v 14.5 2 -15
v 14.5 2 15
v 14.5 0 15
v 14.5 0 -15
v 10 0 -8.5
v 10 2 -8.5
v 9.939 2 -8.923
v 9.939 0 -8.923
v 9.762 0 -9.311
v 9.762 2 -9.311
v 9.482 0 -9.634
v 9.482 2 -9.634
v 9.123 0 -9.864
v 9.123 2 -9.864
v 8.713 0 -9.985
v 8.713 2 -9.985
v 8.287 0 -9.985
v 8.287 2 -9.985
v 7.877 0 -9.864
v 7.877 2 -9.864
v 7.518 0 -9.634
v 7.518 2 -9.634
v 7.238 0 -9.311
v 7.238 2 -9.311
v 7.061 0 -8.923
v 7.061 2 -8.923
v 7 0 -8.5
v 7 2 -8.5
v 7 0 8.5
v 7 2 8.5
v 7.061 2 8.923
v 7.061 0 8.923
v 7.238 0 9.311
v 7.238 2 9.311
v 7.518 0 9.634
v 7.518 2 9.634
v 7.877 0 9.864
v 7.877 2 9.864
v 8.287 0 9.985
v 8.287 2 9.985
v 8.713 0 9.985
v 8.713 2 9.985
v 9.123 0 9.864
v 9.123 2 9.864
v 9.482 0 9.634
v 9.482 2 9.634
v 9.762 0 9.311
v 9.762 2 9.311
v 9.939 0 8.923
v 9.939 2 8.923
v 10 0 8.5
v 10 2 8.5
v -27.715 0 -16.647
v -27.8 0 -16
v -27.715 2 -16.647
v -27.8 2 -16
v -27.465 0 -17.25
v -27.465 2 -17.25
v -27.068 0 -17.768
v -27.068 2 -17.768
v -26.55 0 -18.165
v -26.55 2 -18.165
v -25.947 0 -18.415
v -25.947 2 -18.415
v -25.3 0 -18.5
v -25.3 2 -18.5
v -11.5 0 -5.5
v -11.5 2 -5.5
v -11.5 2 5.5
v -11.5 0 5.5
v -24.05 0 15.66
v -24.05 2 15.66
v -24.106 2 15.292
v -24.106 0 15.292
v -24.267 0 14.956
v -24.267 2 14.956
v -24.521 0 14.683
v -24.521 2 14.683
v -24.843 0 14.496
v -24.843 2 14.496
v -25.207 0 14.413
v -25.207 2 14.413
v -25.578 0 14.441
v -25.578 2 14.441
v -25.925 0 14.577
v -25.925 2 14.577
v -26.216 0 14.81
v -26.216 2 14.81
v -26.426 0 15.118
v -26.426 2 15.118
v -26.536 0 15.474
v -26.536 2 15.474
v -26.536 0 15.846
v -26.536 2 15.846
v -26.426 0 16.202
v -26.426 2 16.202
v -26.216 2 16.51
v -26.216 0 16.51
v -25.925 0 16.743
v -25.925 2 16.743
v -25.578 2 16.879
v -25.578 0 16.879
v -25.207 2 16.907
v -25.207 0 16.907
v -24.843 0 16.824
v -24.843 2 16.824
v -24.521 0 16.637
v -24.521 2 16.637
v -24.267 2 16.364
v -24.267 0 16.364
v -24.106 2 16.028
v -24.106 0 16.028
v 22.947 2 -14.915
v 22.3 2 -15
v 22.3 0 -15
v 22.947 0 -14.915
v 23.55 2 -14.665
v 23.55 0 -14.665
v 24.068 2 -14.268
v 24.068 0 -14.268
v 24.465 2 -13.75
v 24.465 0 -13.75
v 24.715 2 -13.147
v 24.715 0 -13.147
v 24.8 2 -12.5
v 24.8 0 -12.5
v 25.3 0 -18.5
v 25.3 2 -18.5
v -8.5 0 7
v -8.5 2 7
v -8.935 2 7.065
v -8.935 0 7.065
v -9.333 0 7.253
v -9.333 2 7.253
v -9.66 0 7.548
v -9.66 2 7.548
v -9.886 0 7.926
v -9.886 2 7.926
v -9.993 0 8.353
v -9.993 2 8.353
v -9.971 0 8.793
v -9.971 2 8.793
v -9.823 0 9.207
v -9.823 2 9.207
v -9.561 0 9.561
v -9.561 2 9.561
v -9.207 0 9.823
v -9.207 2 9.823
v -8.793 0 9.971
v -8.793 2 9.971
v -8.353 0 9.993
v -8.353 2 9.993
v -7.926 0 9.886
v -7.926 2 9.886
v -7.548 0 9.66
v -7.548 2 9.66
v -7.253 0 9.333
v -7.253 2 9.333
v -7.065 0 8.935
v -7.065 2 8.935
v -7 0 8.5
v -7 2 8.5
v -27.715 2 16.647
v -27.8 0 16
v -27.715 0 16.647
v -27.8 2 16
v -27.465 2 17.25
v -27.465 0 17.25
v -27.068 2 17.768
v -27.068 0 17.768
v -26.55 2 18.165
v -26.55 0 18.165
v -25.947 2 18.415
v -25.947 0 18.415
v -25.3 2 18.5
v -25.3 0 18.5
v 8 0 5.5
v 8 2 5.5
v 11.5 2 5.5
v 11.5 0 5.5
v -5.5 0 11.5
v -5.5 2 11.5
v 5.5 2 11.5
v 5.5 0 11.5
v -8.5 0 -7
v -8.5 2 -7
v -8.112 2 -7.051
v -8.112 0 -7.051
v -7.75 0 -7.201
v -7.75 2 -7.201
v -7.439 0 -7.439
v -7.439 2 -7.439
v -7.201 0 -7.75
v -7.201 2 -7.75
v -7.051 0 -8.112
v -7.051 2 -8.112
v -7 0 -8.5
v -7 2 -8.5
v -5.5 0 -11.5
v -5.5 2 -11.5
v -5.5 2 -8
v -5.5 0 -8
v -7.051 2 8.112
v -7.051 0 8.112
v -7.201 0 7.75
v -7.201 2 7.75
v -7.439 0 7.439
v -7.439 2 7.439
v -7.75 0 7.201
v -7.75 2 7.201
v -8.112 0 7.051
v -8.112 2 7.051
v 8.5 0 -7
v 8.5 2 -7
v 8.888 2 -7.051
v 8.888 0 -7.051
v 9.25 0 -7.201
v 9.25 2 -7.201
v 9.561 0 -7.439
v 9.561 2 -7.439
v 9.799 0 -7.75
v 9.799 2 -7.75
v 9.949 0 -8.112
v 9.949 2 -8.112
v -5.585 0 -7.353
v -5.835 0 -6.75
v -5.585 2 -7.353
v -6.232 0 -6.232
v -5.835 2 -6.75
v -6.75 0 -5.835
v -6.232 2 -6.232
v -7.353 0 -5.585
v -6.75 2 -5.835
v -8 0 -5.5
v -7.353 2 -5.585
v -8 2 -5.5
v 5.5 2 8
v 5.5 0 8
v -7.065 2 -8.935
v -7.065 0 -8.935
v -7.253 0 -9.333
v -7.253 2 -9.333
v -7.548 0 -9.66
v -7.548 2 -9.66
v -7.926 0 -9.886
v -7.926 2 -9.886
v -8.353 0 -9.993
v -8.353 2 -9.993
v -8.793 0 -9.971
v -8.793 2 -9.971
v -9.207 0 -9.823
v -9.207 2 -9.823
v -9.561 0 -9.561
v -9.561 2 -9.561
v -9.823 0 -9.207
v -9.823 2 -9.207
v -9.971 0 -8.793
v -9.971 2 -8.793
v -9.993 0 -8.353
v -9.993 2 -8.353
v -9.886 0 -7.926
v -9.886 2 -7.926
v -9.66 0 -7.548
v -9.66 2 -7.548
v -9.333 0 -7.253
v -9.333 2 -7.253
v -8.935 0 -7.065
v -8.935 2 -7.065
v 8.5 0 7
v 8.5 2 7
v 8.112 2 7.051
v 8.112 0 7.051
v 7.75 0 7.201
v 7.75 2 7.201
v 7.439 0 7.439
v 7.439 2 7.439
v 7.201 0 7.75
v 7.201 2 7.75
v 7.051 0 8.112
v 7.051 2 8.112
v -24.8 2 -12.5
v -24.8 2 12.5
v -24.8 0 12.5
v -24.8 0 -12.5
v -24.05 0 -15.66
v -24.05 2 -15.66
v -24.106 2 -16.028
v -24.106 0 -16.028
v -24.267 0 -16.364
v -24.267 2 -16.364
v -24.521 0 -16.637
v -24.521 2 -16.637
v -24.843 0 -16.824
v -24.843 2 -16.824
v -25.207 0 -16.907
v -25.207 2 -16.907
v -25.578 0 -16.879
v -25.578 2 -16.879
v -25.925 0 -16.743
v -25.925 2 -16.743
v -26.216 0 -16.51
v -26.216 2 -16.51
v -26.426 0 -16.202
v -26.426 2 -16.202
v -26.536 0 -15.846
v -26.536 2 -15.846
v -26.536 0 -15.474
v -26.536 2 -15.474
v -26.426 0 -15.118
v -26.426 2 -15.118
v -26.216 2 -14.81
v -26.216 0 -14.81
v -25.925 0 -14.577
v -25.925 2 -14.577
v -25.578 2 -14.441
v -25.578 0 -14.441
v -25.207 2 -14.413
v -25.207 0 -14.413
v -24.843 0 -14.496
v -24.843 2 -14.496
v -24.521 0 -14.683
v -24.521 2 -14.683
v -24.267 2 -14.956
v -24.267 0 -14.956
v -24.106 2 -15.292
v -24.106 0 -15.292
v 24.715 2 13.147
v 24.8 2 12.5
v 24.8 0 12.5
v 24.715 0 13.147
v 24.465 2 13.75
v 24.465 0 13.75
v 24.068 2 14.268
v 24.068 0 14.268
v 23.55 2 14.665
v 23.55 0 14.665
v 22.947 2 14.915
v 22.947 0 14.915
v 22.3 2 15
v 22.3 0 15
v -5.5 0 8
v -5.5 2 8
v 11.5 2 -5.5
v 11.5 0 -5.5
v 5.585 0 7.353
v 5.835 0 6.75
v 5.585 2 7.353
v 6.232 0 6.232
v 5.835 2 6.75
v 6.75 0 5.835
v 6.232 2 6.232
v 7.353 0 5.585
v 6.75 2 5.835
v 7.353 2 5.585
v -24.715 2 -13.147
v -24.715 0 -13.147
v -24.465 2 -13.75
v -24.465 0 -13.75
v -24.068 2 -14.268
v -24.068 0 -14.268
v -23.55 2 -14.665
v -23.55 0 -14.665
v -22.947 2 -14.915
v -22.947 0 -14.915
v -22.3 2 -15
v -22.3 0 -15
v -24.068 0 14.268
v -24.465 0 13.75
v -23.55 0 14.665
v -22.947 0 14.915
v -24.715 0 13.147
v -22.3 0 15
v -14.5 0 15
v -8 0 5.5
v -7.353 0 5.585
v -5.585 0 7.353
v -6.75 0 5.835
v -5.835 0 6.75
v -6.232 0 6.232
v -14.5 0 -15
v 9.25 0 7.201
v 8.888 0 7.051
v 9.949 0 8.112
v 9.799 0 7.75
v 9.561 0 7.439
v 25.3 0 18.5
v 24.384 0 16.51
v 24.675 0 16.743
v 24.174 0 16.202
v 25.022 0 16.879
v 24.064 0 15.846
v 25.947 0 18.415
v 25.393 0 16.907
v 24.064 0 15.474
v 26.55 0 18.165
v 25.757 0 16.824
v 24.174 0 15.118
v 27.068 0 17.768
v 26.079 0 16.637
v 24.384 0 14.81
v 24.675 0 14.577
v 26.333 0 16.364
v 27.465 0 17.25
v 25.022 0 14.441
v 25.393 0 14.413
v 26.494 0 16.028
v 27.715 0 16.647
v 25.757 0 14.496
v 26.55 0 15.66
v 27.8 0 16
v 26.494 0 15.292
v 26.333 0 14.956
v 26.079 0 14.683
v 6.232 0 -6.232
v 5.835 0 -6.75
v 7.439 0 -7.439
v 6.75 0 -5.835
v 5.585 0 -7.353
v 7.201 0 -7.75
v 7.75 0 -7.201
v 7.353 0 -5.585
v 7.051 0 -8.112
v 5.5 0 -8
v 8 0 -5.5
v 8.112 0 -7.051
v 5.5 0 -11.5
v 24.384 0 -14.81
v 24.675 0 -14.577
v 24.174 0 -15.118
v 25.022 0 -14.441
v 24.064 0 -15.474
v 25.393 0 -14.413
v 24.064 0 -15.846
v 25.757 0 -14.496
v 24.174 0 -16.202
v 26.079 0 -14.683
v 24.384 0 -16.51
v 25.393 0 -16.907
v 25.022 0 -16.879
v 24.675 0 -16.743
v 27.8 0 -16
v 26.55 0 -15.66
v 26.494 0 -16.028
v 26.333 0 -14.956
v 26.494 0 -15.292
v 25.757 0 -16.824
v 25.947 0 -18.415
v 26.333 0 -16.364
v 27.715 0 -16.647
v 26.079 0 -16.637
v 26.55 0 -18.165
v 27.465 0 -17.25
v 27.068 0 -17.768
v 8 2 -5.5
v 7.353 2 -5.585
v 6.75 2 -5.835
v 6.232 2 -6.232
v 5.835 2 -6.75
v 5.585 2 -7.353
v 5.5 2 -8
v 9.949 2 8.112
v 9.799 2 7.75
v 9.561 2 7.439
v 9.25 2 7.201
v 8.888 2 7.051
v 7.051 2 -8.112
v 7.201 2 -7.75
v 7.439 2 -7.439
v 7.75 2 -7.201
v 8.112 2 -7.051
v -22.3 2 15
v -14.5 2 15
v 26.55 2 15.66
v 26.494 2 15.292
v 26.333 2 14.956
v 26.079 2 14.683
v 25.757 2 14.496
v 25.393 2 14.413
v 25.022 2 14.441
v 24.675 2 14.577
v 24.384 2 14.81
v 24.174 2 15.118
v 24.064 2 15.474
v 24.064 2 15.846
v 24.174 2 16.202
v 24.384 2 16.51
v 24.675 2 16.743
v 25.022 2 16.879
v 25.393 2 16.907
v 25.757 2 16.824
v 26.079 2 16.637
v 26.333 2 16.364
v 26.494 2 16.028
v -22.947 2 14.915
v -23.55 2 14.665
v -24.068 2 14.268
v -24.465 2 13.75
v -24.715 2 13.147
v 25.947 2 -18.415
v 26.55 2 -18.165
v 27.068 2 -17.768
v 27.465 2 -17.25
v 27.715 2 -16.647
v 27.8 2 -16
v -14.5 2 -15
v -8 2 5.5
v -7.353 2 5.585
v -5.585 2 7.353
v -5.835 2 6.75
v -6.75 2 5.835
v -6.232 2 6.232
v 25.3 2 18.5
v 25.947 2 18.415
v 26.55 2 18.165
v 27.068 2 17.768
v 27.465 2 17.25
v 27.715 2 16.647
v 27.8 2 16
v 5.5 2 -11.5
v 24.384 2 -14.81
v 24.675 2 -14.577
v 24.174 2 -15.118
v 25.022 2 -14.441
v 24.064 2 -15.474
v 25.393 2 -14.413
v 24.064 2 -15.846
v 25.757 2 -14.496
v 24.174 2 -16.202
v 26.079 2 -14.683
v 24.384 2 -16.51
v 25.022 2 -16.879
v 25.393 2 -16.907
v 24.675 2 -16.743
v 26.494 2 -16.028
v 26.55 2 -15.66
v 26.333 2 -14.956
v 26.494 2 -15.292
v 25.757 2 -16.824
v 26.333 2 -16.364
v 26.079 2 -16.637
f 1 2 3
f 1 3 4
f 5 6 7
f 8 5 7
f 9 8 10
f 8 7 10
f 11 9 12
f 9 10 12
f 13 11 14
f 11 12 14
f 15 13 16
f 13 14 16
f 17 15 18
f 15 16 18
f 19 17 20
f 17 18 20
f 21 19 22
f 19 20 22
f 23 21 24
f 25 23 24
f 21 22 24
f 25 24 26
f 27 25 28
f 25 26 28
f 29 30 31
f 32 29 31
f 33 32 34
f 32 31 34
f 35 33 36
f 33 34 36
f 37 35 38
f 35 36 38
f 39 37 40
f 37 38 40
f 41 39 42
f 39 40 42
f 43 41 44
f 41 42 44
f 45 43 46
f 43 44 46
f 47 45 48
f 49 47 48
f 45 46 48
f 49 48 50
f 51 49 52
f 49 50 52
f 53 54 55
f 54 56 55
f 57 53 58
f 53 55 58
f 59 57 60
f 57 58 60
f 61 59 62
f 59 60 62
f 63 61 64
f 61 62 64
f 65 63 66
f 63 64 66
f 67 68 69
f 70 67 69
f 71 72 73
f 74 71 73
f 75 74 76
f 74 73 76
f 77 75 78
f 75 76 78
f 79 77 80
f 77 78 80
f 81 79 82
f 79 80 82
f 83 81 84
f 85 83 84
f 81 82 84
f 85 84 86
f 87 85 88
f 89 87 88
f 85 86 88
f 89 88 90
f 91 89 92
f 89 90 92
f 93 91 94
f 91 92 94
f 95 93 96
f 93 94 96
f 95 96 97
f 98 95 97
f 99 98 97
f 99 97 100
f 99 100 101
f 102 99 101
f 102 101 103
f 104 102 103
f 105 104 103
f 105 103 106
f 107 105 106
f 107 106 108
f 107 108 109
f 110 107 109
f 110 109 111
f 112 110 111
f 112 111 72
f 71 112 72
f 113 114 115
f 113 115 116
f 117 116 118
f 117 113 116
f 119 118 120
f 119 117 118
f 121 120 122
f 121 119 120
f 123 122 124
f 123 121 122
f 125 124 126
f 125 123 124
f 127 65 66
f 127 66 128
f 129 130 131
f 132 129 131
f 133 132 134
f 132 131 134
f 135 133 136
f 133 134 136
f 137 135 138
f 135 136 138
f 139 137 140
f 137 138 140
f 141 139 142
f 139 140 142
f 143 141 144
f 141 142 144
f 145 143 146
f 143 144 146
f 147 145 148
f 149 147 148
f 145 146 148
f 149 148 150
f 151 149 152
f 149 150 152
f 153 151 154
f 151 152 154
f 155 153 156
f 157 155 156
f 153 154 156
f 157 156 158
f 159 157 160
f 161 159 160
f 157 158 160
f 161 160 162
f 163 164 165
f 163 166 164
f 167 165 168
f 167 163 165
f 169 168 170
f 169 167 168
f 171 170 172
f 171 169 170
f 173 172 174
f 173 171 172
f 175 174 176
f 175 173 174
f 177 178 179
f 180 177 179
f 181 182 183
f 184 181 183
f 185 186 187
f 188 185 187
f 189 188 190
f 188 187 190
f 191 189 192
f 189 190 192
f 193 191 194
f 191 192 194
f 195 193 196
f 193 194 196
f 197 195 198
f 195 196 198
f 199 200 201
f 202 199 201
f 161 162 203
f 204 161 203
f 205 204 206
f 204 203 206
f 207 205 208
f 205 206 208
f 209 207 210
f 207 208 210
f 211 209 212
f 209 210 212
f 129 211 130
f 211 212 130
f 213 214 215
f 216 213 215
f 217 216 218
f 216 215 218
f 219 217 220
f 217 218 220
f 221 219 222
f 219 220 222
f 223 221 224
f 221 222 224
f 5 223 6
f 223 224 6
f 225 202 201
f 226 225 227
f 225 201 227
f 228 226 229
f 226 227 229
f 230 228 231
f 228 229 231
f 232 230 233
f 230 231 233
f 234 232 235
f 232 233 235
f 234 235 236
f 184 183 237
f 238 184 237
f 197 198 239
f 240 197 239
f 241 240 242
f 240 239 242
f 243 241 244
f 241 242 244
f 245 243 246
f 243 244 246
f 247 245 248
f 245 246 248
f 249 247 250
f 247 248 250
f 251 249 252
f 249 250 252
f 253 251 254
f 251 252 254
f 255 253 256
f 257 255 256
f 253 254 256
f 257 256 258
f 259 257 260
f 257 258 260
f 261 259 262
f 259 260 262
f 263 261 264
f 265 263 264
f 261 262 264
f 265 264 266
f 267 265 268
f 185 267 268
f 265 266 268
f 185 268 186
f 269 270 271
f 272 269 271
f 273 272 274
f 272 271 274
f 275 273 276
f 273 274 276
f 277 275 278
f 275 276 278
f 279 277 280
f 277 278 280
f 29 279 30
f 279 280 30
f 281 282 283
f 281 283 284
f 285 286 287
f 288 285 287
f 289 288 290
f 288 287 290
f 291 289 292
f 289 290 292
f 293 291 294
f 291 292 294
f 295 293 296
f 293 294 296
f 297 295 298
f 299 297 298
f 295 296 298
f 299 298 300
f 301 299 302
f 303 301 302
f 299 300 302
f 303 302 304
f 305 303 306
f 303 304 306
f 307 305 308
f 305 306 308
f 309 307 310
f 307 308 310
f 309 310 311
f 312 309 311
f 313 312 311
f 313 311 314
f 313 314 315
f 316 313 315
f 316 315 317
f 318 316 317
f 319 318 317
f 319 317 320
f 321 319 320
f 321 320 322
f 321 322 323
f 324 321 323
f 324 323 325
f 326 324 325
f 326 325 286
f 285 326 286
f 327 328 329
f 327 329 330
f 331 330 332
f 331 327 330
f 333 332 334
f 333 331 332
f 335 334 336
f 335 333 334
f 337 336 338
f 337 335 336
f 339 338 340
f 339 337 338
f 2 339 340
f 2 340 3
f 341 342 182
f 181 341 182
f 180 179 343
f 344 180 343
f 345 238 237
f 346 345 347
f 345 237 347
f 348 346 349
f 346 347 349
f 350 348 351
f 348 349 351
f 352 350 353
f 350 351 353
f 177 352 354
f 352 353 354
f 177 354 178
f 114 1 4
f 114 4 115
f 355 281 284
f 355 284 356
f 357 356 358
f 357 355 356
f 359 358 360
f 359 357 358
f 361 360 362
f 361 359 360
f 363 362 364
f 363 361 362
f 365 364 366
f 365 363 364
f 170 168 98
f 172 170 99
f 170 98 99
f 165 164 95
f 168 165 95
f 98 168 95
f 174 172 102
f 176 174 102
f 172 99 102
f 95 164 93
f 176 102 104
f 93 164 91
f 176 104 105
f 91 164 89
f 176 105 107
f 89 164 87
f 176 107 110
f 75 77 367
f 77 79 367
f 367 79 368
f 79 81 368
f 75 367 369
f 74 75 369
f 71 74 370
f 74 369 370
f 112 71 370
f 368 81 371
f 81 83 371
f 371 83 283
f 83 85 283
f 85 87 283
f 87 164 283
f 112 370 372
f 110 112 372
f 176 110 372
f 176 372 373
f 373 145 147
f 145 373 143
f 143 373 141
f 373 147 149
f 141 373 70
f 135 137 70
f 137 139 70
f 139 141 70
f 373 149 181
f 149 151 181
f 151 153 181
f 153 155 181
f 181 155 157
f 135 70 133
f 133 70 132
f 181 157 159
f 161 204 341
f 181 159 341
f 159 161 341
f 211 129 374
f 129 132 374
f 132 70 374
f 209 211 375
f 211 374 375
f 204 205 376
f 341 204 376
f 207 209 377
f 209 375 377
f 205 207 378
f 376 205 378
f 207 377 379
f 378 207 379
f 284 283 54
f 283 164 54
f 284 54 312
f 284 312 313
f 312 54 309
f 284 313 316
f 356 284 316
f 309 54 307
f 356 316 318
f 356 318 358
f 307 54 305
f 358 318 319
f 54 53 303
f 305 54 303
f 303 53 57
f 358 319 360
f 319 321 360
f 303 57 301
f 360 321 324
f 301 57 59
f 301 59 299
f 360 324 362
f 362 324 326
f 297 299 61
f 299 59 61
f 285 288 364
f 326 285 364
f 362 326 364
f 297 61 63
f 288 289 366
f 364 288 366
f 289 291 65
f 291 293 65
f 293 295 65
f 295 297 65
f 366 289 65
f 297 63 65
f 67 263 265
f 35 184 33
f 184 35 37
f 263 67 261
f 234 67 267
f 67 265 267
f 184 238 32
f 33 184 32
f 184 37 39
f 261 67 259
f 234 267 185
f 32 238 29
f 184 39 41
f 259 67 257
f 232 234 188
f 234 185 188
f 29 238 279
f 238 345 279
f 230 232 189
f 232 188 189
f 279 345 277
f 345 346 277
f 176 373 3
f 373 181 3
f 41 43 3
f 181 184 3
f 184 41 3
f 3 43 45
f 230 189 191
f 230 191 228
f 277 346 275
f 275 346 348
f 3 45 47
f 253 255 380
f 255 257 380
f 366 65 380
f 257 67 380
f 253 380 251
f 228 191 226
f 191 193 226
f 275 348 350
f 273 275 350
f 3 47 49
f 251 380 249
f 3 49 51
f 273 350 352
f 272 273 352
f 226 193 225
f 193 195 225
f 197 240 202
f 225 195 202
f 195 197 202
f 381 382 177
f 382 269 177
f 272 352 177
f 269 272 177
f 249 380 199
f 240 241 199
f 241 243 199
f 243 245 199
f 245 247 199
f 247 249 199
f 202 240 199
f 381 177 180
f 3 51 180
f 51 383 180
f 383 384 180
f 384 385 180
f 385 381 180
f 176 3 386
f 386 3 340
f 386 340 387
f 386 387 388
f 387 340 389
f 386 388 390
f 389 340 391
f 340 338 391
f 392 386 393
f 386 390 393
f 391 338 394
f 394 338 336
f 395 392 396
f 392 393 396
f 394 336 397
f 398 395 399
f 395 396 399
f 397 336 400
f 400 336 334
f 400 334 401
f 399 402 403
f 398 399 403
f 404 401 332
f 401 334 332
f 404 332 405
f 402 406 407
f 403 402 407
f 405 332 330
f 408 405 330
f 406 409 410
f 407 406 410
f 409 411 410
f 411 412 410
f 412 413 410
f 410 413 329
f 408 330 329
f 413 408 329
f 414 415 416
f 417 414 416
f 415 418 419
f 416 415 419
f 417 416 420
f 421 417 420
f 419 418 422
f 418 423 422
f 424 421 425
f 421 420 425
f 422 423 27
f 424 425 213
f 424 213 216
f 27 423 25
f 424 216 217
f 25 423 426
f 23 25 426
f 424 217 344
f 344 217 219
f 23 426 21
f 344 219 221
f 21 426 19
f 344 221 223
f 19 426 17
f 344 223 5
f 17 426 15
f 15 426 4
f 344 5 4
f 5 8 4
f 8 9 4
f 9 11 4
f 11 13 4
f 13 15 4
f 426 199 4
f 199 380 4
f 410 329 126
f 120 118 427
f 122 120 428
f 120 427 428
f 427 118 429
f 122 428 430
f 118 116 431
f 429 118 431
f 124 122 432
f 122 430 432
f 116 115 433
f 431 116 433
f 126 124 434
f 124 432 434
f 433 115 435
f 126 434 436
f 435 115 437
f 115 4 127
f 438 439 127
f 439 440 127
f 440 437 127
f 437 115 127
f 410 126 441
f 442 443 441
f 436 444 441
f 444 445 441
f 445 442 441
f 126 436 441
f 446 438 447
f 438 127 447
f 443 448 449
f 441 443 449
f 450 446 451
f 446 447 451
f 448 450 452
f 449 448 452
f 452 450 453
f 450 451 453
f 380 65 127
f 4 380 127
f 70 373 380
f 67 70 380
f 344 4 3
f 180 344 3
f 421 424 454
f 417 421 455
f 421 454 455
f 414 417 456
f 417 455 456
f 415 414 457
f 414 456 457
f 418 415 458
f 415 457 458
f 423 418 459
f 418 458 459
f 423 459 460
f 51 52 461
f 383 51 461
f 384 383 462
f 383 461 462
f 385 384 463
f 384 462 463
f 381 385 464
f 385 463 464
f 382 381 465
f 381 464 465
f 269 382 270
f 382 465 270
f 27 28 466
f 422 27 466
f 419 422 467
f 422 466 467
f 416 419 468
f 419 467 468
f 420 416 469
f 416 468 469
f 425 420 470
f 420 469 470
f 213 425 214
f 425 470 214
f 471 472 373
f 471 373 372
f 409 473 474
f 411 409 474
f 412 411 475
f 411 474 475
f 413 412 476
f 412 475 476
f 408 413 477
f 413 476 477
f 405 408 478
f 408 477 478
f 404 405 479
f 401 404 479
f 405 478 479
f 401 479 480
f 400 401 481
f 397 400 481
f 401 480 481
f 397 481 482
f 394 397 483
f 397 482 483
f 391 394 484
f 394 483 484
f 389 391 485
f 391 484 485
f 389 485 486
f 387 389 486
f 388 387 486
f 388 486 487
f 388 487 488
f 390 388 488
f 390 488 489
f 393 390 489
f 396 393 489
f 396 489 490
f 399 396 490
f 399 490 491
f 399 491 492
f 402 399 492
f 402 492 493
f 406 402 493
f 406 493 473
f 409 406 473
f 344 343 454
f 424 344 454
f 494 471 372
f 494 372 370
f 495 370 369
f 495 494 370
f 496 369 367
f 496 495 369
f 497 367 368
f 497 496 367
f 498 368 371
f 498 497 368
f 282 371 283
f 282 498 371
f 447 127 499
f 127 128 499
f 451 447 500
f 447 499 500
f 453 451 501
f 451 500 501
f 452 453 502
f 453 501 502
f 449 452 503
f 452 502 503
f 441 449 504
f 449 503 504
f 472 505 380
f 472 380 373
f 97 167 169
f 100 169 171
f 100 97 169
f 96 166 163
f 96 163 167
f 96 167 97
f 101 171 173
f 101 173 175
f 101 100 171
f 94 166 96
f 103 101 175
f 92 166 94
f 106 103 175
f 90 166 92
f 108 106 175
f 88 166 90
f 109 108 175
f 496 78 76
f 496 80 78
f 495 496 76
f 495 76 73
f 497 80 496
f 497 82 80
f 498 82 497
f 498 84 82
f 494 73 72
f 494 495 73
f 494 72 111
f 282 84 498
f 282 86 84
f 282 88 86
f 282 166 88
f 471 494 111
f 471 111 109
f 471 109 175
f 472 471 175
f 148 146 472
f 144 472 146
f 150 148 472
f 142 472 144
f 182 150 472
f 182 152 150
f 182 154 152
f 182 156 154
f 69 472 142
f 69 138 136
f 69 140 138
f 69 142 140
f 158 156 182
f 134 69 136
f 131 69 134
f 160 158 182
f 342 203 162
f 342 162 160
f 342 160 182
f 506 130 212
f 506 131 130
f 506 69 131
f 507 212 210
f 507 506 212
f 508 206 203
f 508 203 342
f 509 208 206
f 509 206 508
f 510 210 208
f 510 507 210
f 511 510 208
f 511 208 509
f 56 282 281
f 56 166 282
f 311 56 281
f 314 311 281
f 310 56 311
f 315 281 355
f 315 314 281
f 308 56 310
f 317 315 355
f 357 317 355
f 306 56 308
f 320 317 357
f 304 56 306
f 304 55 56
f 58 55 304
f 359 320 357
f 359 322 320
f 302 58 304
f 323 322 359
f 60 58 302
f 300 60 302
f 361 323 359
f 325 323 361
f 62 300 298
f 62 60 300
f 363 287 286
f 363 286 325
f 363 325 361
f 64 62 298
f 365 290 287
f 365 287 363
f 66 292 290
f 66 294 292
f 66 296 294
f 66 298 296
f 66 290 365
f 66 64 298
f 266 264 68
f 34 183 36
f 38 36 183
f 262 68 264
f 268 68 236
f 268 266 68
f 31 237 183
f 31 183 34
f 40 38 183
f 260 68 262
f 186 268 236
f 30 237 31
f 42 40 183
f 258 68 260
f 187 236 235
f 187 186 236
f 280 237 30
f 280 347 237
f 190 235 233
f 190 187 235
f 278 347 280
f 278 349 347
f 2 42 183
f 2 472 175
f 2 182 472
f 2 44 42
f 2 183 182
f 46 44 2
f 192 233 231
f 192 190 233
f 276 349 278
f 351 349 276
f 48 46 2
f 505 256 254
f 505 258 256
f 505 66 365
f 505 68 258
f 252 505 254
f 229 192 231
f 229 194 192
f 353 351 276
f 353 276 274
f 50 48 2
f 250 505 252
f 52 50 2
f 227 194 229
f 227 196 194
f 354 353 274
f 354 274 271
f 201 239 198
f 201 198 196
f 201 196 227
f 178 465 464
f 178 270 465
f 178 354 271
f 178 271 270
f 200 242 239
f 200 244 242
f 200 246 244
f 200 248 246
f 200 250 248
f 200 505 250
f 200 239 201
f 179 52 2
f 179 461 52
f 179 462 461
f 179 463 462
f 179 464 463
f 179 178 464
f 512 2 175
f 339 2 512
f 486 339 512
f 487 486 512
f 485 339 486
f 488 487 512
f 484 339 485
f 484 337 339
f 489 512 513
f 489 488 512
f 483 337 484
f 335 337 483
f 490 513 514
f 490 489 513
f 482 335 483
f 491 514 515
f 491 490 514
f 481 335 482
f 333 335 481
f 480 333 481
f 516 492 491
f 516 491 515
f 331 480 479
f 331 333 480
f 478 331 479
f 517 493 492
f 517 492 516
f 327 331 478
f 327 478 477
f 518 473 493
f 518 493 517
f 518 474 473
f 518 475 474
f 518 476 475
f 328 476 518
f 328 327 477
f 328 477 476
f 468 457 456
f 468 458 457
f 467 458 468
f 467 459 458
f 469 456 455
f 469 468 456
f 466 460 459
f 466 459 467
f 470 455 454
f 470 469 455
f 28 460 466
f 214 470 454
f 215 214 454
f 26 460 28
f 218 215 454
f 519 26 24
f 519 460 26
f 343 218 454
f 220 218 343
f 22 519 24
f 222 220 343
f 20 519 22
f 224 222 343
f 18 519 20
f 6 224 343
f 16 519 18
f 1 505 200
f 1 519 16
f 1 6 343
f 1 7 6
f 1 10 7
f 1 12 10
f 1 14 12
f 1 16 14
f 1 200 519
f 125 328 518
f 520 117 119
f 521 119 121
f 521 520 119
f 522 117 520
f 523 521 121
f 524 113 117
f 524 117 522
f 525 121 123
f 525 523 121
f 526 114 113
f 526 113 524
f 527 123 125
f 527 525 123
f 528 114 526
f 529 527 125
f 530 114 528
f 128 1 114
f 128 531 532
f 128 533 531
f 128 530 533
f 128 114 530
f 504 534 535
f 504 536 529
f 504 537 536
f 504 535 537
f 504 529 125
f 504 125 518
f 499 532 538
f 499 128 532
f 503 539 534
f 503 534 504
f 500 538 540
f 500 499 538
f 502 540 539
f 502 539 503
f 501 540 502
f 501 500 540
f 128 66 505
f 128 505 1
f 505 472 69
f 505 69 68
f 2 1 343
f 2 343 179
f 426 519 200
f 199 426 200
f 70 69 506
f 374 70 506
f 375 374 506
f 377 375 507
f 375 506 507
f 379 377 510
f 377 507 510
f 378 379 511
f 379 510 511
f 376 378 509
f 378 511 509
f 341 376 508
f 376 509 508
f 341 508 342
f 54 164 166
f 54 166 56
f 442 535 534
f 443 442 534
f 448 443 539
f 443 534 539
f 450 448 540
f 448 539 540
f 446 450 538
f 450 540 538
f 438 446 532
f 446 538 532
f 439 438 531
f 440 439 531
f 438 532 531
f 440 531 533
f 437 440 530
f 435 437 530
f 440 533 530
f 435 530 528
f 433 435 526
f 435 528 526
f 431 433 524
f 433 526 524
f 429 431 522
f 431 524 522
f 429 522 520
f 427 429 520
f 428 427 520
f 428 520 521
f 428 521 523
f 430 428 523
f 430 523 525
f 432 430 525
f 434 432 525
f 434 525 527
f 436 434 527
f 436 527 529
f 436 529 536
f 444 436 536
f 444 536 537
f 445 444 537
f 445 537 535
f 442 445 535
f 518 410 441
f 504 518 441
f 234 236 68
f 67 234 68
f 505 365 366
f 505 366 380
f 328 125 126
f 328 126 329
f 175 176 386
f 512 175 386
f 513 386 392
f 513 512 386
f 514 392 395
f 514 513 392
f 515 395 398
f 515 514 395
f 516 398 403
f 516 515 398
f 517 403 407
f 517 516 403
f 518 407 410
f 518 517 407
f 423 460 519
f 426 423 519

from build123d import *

# Parameters (mm, degrees)
SKETCH1_W           = 55.6
SKETCH1_H           = 37
BOSS_EXTRUDE1_DEPTH = 2
CUT_EXTRUDE2_REACH  = 4
FILLET2_R           = 2.5
CUT_EXTRUDE3_REACH  = 4
CUT_EXTRUDE4_REACH  = 4
SKETCH7_R           = 1.25
CUT_EXTRUDE5_DEPTH  = 10


with BuildPart() as part:
    # Sketch1 → Boss-Extrude1 (new body)
    with BuildSketch(Plane(origin=(0, 0, 0), x_dir=(1, 0, 0), z_dir=(0, 1, 0))):
        Rectangle(SKETCH1_W, SKETCH1_H)
    extrude(amount=BOSS_EXTRUDE1_DEPTH)

    # Sketch5 → Cut-Extrude2 (cut, up to next)
    with BuildSketch(Plane(origin=(0, 2, 0), x_dir=(1, 0, 0), z_dir=(0, 1, 0)), mode=Mode.PRIVATE) as cut_extrude2_sk1:
        with BuildLine():
            Line((5.5, 11.5), (-5.5, 11.5))
            Line((-5.5, 11.5), (-5.5, 8))
            ThreePointArc((-5.5, 8), (-6.232233047, 6.232233047), (-8, 5.5))
            Line((-8, 5.5), (-11.5, 5.5))
            Line((-11.5, 5.5), (-11.5, -5.5))
            Line((-11.5, -5.5), (-8, -5.5))
            ThreePointArc((-8, -5.5), (-6.232233047, -6.232233047), (-5.5, -8))
            Line((-5.5, -8), (-5.5, -11.5))
            Line((-5.5, -11.5), (5.5, -11.5))
            Line((5.5, -11.5), (5.5, -8))
            ThreePointArc((5.5, -8), (6.232233047, -6.232233047), (8, -5.5))
            Line((8, -5.5), (11.5, -5.5))
            Line((11.5, -5.5), (11.5, 5.5))
            Line((11.5, 5.5), (8, 5.5))
            ThreePointArc((8, 5.5), (6.232233047, 6.232233047), (5.5, 8))
            Line((5.5, 8), (5.5, 11.5))
        make_face()
    cut_extrude2_tool1 = extrude(cut_extrude2_sk1.sketch, amount=-CUT_EXTRUDE2_REACH, mode=Mode.PRIVATE) & part.part
    add(cut_extrude2_tool1.solids().sort_by_distance((0, 2, 0))[0], mode=Mode.SUBTRACT)

    # Fillet2
    fillet2_edges = [part.edges().sort_by_distance(p)[0] for p in [
        (27.8, 1, 18.5),
        (-27.8, 1, 18.5),
        (-27.8, 1, -18.5),
        (27.8, 1, -18.5),
    ]]
    fillet(fillet2_edges, radius=FILLET2_R)

    # Sketch6 → Cut-Extrude3 (cut, up to next)
    with BuildSketch(Plane(origin=(0, 2, 0), x_dir=(1, 0, 0), z_dir=(0, 1, 0)), mode=Mode.PRIVATE) as cut_extrude3_sk1:
        with BuildLine():
            Line((-22.3, 15), (-14.5, 15))
            Line((-14.5, 15), (-14.5, -15))
            Line((-14.5, -15), (-22.3, -15))
            ThreePointArc((-22.3, -15), (-24.067766953, -14.267766953), (-24.8, -12.5))
            Line((-24.8, -12.5), (-24.8, 12.5))
            ThreePointArc((-24.8, 12.5), (-24.067766953, 14.267766953), (-22.3, 15))
        make_face()
    cut_extrude3_tool1 = extrude(cut_extrude3_sk1.sketch, amount=-CUT_EXTRUDE3_REACH, mode=Mode.PRIVATE) & part.part
    add(cut_extrude3_tool1.solids().sort_by_distance((-19.60979, 2, 0))[0], mode=Mode.SUBTRACT)
    # Sketch6 → Cut-Extrude3 (cut, up to next)
    with BuildSketch(Plane(origin=(0, 2, 0), x_dir=(1, 0, 0), z_dir=(0, 1, 0)), mode=Mode.PRIVATE) as cut_extrude3_sk2:
        with BuildLine():
            Line((22.3, -15), (14.5, -15))
            Line((14.5, -15), (14.5, 15))
            Line((14.5, 15), (22.3, 15))
            ThreePointArc((22.3, 15), (24.067766953, 14.267766953), (24.8, 12.5))
            Line((24.8, 12.5), (24.8, -12.5))
            ThreePointArc((24.8, -12.5), (24.067766953, -14.267766953), (22.3, -15))
        make_face()
    cut_extrude3_tool2 = extrude(cut_extrude3_sk2.sketch, amount=-CUT_EXTRUDE3_REACH, mode=Mode.PRIVATE) & part.part
    add(cut_extrude3_tool2.solids().sort_by_distance((19.60979, 2, 0))[0], mode=Mode.SUBTRACT)

    # Sketch7 → Cut-Extrude4 (cut, up to next)
    with BuildSketch(Plane(origin=(0, 2, 0), x_dir=(1, 0, 0), z_dir=(0, 1, 0)), mode=Mode.PRIVATE) as cut_extrude4_sk1:
        with Locations((-25.3, 15.66)):
            Circle(SKETCH7_R)
    cut_extrude4_tool1 = extrude(cut_extrude4_sk1.sketch, amount=-CUT_EXTRUDE4_REACH, mode=Mode.PRIVATE) & part.part
    add(cut_extrude4_tool1.solids().sort_by_distance((-25.3, 2, -15.66))[0], mode=Mode.SUBTRACT)
    # Sketch7 → Cut-Extrude4 (cut, up to next)
    with BuildSketch(Plane(origin=(0, 2, 0), x_dir=(1, 0, 0), z_dir=(0, 1, 0)), mode=Mode.PRIVATE) as cut_extrude4_sk2:
        with Locations((25.3, 15.66)):
            Circle(SKETCH7_R)
    cut_extrude4_tool2 = extrude(cut_extrude4_sk2.sketch, amount=-CUT_EXTRUDE4_REACH, mode=Mode.PRIVATE) & part.part
    add(cut_extrude4_tool2.solids().sort_by_distance((25.3, 2, -15.66))[0], mode=Mode.SUBTRACT)
    # Sketch7 → Cut-Extrude4 (cut, up to next)
    with BuildSketch(Plane(origin=(0, 2, 0), x_dir=(1, 0, 0), z_dir=(0, 1, 0)), mode=Mode.PRIVATE) as cut_extrude4_sk3:
        with Locations((25.3, -15.66)):
            Circle(SKETCH7_R)
    cut_extrude4_tool3 = extrude(cut_extrude4_sk3.sketch, amount=-CUT_EXTRUDE4_REACH, mode=Mode.PRIVATE) & part.part
    add(cut_extrude4_tool3.solids().sort_by_distance((25.3, 2, 15.66))[0], mode=Mode.SUBTRACT)
    # Sketch7 → Cut-Extrude4 (cut, up to next)
    with BuildSketch(Plane(origin=(0, 2, 0), x_dir=(1, 0, 0), z_dir=(0, 1, 0)), mode=Mode.PRIVATE) as cut_extrude4_sk4:
        with Locations((-25.3, -15.66)):
            Circle(SKETCH7_R)
    cut_extrude4_tool4 = extrude(cut_extrude4_sk4.sketch, amount=-CUT_EXTRUDE4_REACH, mode=Mode.PRIVATE) & part.part
    add(cut_extrude4_tool4.solids().sort_by_distance((-25.3, 2, 15.66))[0], mode=Mode.SUBTRACT)

    # Sketch3 → Cut-Extrude5 (cut)
    with BuildSketch(Plane(origin=(0, 2, 0), x_dir=(1, 0, 0), z_dir=(0, 1, 0))):
        with BuildLine():
            Line((-8.5, 7), (-8.5, 8.5))
            Line((-8.5, 8.5), (-7, 8.5))
            ThreePointArc((-7, 8.5), (-9.560660172, 9.560660172), (-8.5, 7))
        make_face()
        with BuildLine():
            Line((-7, 8.5), (-8.5, 8.5))
            Line((-8.5, 8.5), (-8.5, 7))
            ThreePointArc((-8.5, 7), (-7.439339828, 7.439339828), (-7, 8.5))
        make_face()
        with BuildLine():
            ThreePointArc((10, 8.5), (8.5, 10), (7, 8.5))
            Line((7, 8.5), (8.5, 8.5))
            Line((8.5, 8.5), (8.5, 7))
            ThreePointArc((8.5, 7), (9.560660172, 7.439339828), (10, 8.5))
        make_face()
        with BuildLine():
            Line((8.5, 8.5), (7, 8.5))
            ThreePointArc((7, 8.5), (7.439339828, 7.439339828), (8.5, 7))
            Line((8.5, 7), (8.5, 8.5))
        make_face()
        with BuildLine():
            ThreePointArc((-7, -8.5), (-7.439339828, -7.439339828), (-8.5, -7))
            Line((-8.5, -7), (-8.5, -8.5))
            Line((-8.5, -8.5), (-7, -8.5))
        make_face()
        with BuildLine():
            Line((-8.5, -8.5), (-8.5, -7))
            ThreePointArc((-8.5, -7), (-9.560660172, -9.560660172), (-7, -8.5))
            Line((-7, -8.5), (-8.5, -8.5))
        make_face()
        with BuildLine():
            ThreePointArc((10, -8.5), (9.560660172, -7.439339828), (8.5, -7))
            Line((8.5, -7), (8.5, -8.5))
            Line((8.5, -8.5), (7, -8.5))
            ThreePointArc((7, -8.5), (8.5, -10), (10, -8.5))
        make_face()
        with BuildLine():
            Line((8.5, -8.5), (8.5, -7))
            ThreePointArc((8.5, -7), (7.439339828, -7.439339828), (7, -8.5))
            Line((7, -8.5), (8.5, -8.5))
        make_face()
    extrude(amount=-CUT_EXTRUDE5_DEPTH, mode=Mode.SUBTRACT)


solid = part.part
